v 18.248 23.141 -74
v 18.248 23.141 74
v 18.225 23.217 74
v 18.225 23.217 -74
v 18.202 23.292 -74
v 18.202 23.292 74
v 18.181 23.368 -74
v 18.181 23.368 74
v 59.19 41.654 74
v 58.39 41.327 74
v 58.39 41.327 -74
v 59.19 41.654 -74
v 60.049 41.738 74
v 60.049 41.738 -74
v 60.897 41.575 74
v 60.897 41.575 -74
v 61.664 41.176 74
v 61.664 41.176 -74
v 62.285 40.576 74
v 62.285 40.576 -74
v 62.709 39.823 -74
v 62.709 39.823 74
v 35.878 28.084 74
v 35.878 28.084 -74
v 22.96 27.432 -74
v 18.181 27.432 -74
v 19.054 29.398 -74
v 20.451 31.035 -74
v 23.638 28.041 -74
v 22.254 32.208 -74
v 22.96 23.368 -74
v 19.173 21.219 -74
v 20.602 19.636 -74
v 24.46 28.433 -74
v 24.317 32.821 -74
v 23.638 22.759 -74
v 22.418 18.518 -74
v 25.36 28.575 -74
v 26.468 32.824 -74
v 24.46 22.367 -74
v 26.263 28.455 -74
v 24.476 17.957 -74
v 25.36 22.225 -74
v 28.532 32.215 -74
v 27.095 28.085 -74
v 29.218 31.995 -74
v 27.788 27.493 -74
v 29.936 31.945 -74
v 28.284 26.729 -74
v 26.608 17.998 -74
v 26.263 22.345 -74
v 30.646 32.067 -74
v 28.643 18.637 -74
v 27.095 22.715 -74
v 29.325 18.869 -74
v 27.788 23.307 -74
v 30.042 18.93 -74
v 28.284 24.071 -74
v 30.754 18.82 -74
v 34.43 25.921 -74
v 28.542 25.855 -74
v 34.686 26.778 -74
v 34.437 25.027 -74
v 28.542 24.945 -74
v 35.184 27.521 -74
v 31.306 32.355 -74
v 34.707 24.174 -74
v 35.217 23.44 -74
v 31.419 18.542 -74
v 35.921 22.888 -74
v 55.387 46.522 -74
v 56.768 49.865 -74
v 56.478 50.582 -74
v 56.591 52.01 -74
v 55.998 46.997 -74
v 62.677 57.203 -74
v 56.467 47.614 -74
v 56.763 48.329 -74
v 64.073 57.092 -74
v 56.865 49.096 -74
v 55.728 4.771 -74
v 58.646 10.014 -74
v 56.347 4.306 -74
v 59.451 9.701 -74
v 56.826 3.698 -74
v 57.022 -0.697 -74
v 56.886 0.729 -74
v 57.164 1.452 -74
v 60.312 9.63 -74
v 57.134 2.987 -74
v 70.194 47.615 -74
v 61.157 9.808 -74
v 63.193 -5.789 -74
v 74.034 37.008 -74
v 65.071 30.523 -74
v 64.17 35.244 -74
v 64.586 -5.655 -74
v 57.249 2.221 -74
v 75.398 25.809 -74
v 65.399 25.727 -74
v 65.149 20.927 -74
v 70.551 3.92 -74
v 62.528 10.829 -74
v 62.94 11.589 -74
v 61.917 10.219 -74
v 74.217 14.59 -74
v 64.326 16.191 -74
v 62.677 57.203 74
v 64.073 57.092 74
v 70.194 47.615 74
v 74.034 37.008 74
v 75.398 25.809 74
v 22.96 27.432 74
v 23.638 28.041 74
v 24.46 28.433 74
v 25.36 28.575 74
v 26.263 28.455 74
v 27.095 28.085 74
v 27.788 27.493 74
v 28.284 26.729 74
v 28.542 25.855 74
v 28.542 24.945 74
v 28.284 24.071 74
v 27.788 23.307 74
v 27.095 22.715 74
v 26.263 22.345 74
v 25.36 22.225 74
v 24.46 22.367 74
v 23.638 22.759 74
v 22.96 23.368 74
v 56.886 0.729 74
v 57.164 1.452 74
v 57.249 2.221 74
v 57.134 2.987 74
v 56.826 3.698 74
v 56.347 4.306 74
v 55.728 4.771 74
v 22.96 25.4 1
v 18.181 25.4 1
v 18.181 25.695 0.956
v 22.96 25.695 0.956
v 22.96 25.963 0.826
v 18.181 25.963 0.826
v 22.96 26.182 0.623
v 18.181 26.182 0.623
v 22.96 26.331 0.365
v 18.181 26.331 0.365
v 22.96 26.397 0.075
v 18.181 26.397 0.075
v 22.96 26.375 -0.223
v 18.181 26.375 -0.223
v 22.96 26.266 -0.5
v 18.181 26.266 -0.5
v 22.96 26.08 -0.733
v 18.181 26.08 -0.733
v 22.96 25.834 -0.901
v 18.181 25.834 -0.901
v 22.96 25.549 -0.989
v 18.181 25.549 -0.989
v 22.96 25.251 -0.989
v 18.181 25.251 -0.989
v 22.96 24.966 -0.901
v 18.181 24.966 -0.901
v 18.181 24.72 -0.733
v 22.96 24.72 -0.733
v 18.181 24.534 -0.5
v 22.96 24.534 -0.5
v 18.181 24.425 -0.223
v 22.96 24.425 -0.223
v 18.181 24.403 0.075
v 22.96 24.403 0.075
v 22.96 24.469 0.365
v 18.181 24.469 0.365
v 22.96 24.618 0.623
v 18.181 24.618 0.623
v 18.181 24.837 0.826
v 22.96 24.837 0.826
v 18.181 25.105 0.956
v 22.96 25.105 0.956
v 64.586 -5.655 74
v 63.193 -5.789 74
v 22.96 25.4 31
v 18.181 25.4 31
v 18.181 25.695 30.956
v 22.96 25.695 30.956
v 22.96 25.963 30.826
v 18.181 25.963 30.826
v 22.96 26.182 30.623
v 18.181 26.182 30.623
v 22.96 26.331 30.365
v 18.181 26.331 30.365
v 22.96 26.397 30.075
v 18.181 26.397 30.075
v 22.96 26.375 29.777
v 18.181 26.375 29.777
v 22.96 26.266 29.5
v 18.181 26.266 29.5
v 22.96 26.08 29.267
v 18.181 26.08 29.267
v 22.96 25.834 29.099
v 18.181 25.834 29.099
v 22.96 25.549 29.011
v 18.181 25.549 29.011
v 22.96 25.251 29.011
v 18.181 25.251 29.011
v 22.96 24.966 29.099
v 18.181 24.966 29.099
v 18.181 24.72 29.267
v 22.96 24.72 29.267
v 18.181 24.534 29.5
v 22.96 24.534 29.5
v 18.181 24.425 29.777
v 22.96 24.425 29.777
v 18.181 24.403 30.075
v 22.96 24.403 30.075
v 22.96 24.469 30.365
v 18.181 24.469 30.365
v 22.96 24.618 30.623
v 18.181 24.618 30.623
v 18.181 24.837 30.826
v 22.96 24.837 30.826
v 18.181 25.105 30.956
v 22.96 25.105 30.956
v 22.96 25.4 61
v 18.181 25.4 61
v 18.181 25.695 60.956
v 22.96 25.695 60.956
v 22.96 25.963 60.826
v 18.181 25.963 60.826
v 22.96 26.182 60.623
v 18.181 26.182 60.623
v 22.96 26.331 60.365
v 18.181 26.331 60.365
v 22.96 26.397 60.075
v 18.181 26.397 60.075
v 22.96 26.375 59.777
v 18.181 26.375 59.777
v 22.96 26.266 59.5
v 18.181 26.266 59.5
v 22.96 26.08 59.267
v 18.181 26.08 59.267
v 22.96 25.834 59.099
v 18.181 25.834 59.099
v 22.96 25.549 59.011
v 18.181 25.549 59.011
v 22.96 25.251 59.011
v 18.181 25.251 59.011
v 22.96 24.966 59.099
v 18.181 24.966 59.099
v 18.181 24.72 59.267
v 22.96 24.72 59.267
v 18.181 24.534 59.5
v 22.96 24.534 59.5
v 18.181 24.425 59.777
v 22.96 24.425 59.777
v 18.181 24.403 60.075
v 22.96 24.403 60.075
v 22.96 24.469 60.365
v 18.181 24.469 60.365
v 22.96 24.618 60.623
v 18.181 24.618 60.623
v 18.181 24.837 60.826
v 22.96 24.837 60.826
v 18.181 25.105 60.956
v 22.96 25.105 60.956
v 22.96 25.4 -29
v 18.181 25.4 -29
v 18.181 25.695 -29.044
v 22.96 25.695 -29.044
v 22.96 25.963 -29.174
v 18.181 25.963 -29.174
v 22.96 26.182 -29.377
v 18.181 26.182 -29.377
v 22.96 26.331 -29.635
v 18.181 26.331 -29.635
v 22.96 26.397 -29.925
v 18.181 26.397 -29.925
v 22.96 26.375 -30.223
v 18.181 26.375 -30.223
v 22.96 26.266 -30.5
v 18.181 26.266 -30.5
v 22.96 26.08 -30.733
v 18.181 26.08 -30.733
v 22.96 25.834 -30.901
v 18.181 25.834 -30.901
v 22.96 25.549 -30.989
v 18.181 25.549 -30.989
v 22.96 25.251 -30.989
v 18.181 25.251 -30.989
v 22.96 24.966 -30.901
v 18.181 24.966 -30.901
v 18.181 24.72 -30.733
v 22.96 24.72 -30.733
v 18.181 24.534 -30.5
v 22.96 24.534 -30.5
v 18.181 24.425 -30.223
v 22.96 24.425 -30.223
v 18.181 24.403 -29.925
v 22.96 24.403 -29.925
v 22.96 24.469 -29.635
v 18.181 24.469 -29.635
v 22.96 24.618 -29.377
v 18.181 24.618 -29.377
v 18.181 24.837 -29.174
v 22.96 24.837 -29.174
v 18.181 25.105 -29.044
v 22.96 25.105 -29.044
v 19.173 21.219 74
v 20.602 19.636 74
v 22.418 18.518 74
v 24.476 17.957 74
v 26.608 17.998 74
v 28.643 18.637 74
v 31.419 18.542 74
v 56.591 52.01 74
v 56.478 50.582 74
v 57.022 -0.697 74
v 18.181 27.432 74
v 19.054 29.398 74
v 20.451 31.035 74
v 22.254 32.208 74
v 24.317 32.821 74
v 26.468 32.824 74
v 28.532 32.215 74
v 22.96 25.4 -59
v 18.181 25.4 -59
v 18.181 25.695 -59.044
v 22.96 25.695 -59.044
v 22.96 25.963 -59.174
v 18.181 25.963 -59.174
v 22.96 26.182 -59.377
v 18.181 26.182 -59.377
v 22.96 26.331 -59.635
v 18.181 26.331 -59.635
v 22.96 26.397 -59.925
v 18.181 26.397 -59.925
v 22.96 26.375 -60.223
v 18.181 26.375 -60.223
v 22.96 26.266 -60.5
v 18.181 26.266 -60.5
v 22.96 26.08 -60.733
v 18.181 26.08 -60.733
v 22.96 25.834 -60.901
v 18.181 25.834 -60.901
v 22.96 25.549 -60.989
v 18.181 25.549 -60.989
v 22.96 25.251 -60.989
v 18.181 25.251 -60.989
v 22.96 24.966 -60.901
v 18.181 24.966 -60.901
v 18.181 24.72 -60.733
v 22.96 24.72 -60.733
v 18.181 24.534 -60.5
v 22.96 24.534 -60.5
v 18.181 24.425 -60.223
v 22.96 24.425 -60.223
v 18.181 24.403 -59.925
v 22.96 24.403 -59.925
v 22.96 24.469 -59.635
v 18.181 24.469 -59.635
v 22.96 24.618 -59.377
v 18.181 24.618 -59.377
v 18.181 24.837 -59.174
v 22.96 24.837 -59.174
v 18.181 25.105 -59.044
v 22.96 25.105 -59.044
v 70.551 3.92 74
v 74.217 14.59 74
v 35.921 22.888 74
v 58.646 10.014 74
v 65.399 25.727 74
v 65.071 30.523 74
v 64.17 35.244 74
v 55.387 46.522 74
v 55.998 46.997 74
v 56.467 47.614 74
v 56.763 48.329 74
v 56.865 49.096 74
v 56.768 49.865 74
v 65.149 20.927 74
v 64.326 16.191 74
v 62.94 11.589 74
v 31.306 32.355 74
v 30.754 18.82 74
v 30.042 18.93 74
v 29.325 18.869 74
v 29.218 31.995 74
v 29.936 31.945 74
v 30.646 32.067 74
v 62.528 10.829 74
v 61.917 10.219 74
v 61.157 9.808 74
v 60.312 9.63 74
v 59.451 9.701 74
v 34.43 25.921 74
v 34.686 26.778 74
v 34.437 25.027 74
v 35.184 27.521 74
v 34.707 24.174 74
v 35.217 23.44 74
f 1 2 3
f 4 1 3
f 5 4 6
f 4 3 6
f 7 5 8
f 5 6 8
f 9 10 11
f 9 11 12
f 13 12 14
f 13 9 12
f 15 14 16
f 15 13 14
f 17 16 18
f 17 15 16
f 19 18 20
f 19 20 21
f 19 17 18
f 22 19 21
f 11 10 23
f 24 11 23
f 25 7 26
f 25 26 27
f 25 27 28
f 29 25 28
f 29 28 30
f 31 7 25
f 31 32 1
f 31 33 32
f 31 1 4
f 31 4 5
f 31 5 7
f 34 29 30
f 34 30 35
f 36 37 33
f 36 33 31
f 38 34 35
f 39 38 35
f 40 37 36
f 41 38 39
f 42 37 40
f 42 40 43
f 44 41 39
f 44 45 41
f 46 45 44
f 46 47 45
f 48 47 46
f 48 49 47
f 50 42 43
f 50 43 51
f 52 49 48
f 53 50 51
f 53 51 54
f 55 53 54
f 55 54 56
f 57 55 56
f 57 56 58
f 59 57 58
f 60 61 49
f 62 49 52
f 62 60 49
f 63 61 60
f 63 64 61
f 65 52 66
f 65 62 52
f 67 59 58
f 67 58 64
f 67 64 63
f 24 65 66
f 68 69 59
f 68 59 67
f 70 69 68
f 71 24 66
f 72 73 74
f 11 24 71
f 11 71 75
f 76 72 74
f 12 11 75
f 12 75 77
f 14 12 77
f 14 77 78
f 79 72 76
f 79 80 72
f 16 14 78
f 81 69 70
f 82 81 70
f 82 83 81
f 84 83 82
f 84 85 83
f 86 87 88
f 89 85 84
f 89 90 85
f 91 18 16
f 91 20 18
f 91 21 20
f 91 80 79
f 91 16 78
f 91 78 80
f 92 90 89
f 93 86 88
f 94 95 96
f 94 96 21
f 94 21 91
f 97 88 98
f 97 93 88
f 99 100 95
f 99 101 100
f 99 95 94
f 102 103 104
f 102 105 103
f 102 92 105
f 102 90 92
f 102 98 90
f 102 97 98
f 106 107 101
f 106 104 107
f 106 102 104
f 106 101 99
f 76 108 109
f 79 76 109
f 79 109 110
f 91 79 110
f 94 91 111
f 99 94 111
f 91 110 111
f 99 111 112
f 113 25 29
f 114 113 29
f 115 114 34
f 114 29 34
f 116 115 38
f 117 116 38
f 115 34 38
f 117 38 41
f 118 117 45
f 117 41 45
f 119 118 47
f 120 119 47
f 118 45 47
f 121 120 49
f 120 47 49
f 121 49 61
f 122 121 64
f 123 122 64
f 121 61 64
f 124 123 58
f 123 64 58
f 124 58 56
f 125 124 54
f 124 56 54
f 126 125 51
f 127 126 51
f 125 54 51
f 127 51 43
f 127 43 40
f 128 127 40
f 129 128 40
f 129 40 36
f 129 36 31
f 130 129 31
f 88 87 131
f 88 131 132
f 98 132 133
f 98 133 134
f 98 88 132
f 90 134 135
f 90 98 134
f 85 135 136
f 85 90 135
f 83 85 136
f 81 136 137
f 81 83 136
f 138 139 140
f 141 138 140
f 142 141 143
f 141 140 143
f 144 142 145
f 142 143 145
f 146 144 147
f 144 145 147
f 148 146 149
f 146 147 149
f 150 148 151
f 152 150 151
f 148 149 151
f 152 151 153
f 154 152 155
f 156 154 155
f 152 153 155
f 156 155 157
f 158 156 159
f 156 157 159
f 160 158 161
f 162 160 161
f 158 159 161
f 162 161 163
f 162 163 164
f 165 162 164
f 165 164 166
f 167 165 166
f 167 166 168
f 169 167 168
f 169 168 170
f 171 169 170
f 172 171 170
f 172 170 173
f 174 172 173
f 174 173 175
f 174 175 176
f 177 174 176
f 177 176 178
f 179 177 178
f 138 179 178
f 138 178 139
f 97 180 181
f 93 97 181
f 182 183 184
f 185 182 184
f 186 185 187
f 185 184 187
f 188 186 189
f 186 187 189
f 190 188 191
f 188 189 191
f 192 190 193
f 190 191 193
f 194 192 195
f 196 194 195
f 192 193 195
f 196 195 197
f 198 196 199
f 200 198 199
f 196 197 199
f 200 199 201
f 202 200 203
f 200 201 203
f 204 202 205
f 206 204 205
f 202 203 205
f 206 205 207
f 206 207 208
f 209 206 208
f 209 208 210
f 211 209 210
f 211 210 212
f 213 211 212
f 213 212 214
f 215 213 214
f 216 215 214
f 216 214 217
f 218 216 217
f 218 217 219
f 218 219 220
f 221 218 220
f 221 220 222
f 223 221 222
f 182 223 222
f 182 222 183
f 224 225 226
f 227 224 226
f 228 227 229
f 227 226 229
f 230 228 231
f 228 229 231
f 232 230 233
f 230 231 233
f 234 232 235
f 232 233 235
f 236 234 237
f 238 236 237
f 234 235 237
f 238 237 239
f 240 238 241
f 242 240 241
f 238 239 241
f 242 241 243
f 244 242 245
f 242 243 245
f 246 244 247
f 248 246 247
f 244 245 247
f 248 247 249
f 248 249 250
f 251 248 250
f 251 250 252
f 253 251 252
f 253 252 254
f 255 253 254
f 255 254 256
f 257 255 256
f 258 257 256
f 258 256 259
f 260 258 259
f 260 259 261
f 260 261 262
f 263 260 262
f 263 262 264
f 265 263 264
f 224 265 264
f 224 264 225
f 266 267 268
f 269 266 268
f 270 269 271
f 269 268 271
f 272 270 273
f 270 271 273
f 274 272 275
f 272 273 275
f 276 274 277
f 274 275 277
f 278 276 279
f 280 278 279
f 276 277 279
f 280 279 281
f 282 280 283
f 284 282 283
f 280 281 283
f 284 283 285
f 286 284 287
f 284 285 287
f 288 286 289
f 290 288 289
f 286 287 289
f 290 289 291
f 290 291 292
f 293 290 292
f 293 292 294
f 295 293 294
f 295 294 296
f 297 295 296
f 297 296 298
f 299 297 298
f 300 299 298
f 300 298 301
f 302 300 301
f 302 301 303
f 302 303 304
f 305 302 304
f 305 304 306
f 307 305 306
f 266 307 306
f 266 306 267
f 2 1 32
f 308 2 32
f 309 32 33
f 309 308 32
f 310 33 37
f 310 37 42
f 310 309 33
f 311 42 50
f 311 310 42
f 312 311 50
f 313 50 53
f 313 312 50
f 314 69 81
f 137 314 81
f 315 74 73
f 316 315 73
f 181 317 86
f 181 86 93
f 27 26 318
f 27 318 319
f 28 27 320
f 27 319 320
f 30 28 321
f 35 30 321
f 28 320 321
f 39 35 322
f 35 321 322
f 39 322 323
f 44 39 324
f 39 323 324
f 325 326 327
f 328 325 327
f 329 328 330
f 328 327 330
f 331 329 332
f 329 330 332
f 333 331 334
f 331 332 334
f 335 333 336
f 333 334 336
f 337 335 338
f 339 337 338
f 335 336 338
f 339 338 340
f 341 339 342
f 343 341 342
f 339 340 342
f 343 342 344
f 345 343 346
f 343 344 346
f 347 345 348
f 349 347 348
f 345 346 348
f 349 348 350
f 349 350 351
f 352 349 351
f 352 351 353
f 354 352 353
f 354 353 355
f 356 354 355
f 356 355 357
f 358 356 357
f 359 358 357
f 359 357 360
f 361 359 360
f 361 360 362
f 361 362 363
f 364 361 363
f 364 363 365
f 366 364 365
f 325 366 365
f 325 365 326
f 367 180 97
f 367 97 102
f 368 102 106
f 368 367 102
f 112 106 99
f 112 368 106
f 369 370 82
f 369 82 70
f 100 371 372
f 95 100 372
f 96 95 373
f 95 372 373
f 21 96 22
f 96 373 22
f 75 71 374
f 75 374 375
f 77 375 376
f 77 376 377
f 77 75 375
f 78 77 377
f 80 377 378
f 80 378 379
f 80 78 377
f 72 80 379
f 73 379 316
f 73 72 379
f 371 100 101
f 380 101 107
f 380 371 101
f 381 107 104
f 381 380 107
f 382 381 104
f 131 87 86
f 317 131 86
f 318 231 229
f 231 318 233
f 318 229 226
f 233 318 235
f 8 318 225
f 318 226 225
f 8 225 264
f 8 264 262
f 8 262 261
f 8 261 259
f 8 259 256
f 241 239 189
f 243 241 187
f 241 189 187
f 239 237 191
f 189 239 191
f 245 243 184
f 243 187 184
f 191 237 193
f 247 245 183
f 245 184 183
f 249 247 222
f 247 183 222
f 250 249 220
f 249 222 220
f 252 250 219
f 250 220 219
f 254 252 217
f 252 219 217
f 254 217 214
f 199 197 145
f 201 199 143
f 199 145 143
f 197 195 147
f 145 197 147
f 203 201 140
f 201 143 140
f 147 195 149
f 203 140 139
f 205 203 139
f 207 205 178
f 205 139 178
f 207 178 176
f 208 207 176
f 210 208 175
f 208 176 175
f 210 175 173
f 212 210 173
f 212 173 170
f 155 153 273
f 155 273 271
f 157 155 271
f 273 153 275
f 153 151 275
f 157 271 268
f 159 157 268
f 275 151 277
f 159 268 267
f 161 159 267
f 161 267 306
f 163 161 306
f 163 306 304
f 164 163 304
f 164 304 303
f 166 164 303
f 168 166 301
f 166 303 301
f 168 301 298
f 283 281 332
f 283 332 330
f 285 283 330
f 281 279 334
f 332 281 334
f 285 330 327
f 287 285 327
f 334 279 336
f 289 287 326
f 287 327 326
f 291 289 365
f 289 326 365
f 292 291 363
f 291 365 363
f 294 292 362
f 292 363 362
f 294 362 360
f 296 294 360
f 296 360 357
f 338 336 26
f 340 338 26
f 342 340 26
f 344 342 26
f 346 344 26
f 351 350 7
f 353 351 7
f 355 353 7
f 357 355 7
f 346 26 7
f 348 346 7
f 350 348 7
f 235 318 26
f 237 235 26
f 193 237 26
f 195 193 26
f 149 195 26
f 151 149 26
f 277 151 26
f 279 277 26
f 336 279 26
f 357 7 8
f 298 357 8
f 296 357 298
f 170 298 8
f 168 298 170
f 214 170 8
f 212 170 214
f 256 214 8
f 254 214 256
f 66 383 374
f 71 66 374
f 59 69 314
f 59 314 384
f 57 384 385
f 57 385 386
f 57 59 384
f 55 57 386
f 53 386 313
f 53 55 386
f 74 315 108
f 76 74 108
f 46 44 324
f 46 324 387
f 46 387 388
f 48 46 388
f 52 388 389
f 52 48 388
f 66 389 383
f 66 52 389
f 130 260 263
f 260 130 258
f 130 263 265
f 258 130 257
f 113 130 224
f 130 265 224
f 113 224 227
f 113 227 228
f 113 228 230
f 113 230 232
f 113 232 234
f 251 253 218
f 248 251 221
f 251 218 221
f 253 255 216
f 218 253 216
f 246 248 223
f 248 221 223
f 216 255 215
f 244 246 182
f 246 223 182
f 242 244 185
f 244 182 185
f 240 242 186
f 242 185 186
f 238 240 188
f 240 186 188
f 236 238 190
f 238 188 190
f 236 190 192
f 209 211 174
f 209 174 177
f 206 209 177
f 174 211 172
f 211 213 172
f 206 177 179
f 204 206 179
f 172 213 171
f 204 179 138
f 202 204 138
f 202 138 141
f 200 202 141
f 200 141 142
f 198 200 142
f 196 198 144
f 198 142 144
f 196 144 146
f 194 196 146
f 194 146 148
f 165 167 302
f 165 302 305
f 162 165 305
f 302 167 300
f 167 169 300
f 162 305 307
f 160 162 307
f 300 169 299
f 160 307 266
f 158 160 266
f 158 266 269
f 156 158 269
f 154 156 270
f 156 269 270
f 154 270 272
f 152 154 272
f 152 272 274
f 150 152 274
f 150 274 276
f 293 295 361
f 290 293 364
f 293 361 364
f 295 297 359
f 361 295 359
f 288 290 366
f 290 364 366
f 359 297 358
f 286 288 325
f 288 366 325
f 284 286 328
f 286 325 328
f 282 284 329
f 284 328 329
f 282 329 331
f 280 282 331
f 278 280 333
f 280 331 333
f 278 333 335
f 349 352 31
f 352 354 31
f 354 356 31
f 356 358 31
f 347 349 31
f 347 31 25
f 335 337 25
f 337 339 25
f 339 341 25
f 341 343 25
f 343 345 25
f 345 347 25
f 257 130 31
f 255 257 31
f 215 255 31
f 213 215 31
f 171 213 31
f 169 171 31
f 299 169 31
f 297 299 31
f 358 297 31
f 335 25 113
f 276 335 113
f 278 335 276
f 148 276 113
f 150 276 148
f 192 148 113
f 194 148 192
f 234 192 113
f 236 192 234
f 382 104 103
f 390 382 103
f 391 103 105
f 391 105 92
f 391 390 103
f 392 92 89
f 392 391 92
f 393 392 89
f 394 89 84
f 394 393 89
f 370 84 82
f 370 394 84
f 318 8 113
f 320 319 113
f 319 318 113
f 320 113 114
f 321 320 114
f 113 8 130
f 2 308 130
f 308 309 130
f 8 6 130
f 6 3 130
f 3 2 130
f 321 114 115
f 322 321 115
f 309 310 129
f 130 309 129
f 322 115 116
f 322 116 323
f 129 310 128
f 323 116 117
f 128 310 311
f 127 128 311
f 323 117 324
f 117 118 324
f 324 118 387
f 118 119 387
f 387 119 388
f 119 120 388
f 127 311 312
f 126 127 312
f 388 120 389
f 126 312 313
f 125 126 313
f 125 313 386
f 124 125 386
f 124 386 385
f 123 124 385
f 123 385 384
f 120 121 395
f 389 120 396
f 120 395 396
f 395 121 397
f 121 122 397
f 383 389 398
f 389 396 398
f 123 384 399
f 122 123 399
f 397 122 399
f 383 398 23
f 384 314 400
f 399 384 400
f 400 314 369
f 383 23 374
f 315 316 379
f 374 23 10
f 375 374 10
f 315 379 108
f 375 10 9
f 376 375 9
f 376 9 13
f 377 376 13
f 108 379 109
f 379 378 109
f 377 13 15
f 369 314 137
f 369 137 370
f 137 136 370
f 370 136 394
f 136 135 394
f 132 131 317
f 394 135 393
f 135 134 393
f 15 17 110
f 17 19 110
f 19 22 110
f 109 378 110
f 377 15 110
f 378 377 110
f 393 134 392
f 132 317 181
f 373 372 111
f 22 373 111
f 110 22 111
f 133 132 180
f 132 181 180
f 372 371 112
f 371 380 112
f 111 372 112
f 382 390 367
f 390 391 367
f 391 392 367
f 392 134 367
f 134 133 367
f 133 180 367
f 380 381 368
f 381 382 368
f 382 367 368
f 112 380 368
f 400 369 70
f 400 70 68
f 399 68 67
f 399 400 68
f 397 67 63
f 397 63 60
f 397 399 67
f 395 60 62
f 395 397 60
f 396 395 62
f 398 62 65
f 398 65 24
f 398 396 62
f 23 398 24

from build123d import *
from build123d.topology import SkipClean

# Parameters (mm, degrees)
BOSS_EXTRUDE1_DEPTH     = 74
CHAMFER1_SIZE           = 1
FILLET1_R               = 3
CUT_EXTRUDE1_DEPTH      = 121.138628729
CUT_EXTRUDE1_DEPTH_BACK = 121.138628729
CUT_EXTRUDE2_REACH      = 111.646
SKETCH4_R               = 1


with BuildPart() as part:
    # Sketch1 → Boss-Extrude1 (new, symmetric)
    with BuildSketch(Plane.XY):
        with BuildLine():
            Line((55.830466766, 51.361253738), (63.438083445, 57.851567172))
            ThreePointArc((63.438083445, 57.851567172), (72.243195979, 42.88470747), (75.398327752, 25.808934001))
            Line((75.398327752, 25.808934001), (65.398662212, 25.727147202))
            ThreePointArc((65.398662212, 25.727147202), (64.324262485, 34.614216947), (61.300381376, 43.039802177))
            Line((61.300381376, 43.039802177), (31.399799374, 25.449072083))
            Line((31.399799374, 25.449072083), (26.399966604, 25.408178684))
            ThreePointArc((26.399966604, 25.408178684), (25.395910676, 26.399991642), (24.40000005, 25.400000004))
            ThreePointArc((24.40000005, 25.400000004), (24.411675325, 25.24763781), (24.446428526, 25.098833357))
            Line((24.446428526, 25.098833357), (18.248213622, 23.141250154))
            ThreePointArc((18.248213622, 23.141250154), (17.987564613, 24.25728355), (17.90000005, 25.400000004))
            ThreePointArc((17.90000005, 25.400000004), (21.992343112, 32.081158151), (29.803433168, 31.471225314))
            Line((29.803433168, 31.471225314), (58.257984046, 48.211244769))
            ThreePointArc((58.257984046, 48.211244769), (57.083396924, 49.816436323), (55.830466766, 51.361253738))
        make_face()
    boss_extrude1 = extrude(amount=BOSS_EXTRUDE1_DEPTH, both=True)

    # Mirror1: Boss-Extrude1 across plane
    with SkipClean():  # the faces are left unmerged after this step: merging them gives an invalid solid
        add(boss_extrude1.mirror(Plane(origin=(-0.206032496, 25.190569454, 0), x_dir=(0, 0, 1), z_dir=(0.008178679945042752, -0.9999665540378622, 0))))

    # Chamfer1
    # the kernel refuses this chamfer: 1 mm, written as the material it takes off along each edge
    with BuildSketch(Plane(origin=(55.830466766, 51.361253738, -76.604800739), x_dir=(0.7607616678932755, 0.6490313433604278, 0), z_dir=(0, 0, 1))) as chamfer1_piece_1:
        with BuildLine():
            Line((CHAMFER1_SIZE, 0), (-0.01282473, -1.01282473))
            ThreePointArc((-0.01282473, -1.01282473), (-0.003390265, -0.520777989), (0, 0))
            Line((0, 0), (CHAMFER1_SIZE, 0))
        make_face()
    extrude(amount=153.209601479, mode=Mode.SUBTRACT)
    with BuildSketch(Plane(origin=(63.438083445, 57.851567172, 76.571682988), x_dir=(-0.7607616678932776, -0.6490313433604255, 0), z_dir=(0, 0, -1))) as chamfer1_piece_2:
        with BuildLine():
            Line((CHAMFER1_SIZE, 0), (0.009805807, -0.990194193))
            ThreePointArc((0.009805807, -0.990194193), (0.002592086, -0.509118755), (0, 0))
            Line((0, 0), (CHAMFER1_SIZE, 0))
        make_face()
    extrude(amount=153.143365976, mode=Mode.SUBTRACT)
    with BuildSketch(Plane(origin=(63.963798858, -6.425043932, 76.571682988), x_dir=(0.6288321665267481, 0.7775410640868277, 0), z_dir=(0, 0, -1))) as chamfer1_piece_3:
        with BuildLine():
            Line((0.990242745, 0), (CHAMFER1_SIZE * 0.00990242744899, -CHAMFER1_SIZE * 0.999950969763))
            Line((CHAMFER1_SIZE * 0.00990242744899, -CHAMFER1_SIZE * 0.999950969763), (0, 0))
            ThreePointArc((0, 0), (0.509119461, 0.002449552), (0.990242745, 0))
        make_face()
    extrude(amount=153.143365976, mode=Mode.SUBTRACT)
    with BuildSketch(Plane(origin=(56.251039097, -0.060035145, -76.604800739), x_dir=(0.6266844831673307, 0.7792730962616993, 0), z_dir=(0, 0, 1))) as chamfer1_piece_4:
        with BuildLine():
            Line((1.012905922, 0), (-CHAMFER1_SIZE * 0.0126613240298, -CHAMFER1_SIZE * 0.999919842224))
            Line((-CHAMFER1_SIZE * 0.0126613240298, -CHAMFER1_SIZE * 0.999919842224), (0, 0))
            ThreePointArc((0, 0), (0.520779169, -0.003203746), (1.012905922, 0))
        make_face()
    extrude(amount=153.209601479, mode=Mode.SUBTRACT)

    # Fillet1
    # the kernel refuses this fillet: 3 mm, written as the material it adds along each edge
    with BuildSketch(Plane(origin=(61.300381376, 43.039802177, 74), x_dir=(-0.8619070987590498, -0.5070662216207636, 0), z_dir=(0, 0, -1))) as fillet1_piece_1:
        with BuildLine():
            CenterArc((3.377068823, -3), FILLET1_R, 90, 99.332418184)
            Line((0.416776456, -3.486486486), (0.357570609, -3.496216216))
            ThreePointArc((0.357570609, -3.496216216), (0.110537283, -1.754940397), (-0.059831012, -0.0045))
            Line((-0.059831012, -0.0045), (0, 0.06))
            Line((0, 0.06), (3.377068823, 0.06))
            Line((3.377068823, 0.06), (3.377068823, 0))
        make_face()
    extrude(amount=148)
    with BuildSketch(Plane(origin=(31.399799374, 25.449072083, 74), x_dir=(0.861907098759051, 0.5070662216207618, 0), z_dir=(0, 0, -1))) as fillet1_piece_2:
        with BuildLine():
            CenterArc((FILLET1_R * 1.73205080757, FILLET1_R), FILLET1_R, 150, 120)
            Line((FILLET1_R * 0.866025403784, FILLET1_R * 1.5), (FILLET1_R * 0.848704895709, FILLET1_R * 1.51))
            Line((FILLET1_R * 0.848704895709, FILLET1_R * 1.51), (-FILLET1_R * 0.0346410161514, -FILLET1_R * 0.02))
            Line((-FILLET1_R * 0.0346410161514, -FILLET1_R * 0.02), (FILLET1_R * 1.73205080757, -FILLET1_R * 0.02))
            Line((FILLET1_R * 1.73205080757, -FILLET1_R * 0.02), (FILLET1_R * 1.73205080757, 0))
        make_face()
    extrude(amount=148)
    with BuildSketch(Plane(origin=(29.803433168, 31.471225314, -74), x_dir=(-0.8632427379298097, 0.5047890405025113, 0), z_dir=(0, 0, 1))) as fillet1_piece_3:
        with BuildLine():
            CenterArc((1.767704789, -2.985498375), FILLET1_R, 95.63586305, 55.150095421)
            Line((-0.850702684, -1.521277659), (-0.903070833, -1.491993244))
            Line((-0.903070833, -1.491993244), (-0.052368149, 0.029284414))
            Line((-0.052368149, 0.029284414), (0.005892349, 0.059709968))
            ThreePointArc((0.005892349, 0.059709968), (0.736543662, 0.023745938), (1.467194975, 0.059709968))
            Line((1.467194975, 0.059709968), (1.473087324, 0))
        make_face()
    extrude(amount=148)
    with BuildSketch(Plane(origin=(58.257984046, 48.211244769, -74), x_dir=(-0.6003331349359272, 0.7997500403863709, 0), z_dir=(0, 0, 1))) as fillet1_piece_4:
        with BuildLine():
            CenterArc((3.35394685, 2.974664865), FILLET1_R, 173.574848661, 88.973633867)
            Line((0.372790176, 3.310380343), (0.313167042, 3.317094653))
            Line((0.313167042, 3.317094653), (-0.059623133, 0.00671431))
            Line((-0.059623133, 0.00671431), (-0.002223664, -0.05995878))
            ThreePointArc((-0.002223664, -0.05995878), (1.482442617, -0.087479891), (2.957104003, -0.059493297))
            Line((2.957104003, -0.059493297), (2.964885235, 0))
        make_face()
    extrude(amount=148)
    with BuildSketch(Plane(origin=(61.584109507, 8.349773529, 74), x_dir=(-0.8700857787040926, 0.49290033241710485, 0), z_dir=(0, 0, -1))) as fillet1_piece_5:
        with BuildLine():
            CenterArc((3.377068823, 3), FILLET1_R, 170.667581816, 99.332418184)
            Line((0.416776456, 3.486486486), (0.357570609, 3.496216216))
            ThreePointArc((0.357570609, 3.496216216), (0.110537283, 1.754940397), (-0.059831012, 0.0045))
            Line((-0.059831012, 0.0045), (0, -0.06))
            Line((0, -0.06), (3.377068823, -0.06))
            Line((3.377068823, -0.06), (3.377068823, 0))
        make_face()
    extrude(amount=148)
    with BuildSketch(Plane(origin=(58.626707512, 3.129258857, -74), x_dir=(-0.870085778704093, 0.49290033241710457, 0), z_dir=(0, 0, 1))) as fillet1_piece_6:
        with BuildLine():
            CenterArc((3.331304629, 3), FILLET1_R, 181.026366133, 88.973633867)
            Line((0.331785955, 2.946262469), (0.271795581, 2.945187718))
            ThreePointArc((0.271795581, 2.945187718), (0.078962557, 1.482920686), (-0.059831012, 0.0045))
            Line((-0.059831012, 0.0045), (0, -0.06))
            Line((0, -0.06), (3.331304629, -0.06))
            Line((3.331304629, -0.06), (3.331304629, 0))
        make_face()
    extrude(amount=148)
    with BuildSketch(Plane(origin=(29.902149966, 19.401613043, -74), x_dir=(-0.8548705120852164, -0.5188414088786282, 0), z_dir=(0, 0, 1))) as fillet1_piece_7:
        with BuildLine():
            CenterArc((1.767704789, 2.985498375), FILLET1_R, 209.214041529, 55.150095421)
            Line((-0.850702684, 1.521277659), (-0.903070833, 1.491993244))
            Line((-0.903070833, 1.491993244), (-0.052368149, -0.029284414))
            Line((-0.052368149, -0.029284414), (0.005892349, -0.059709968))
            ThreePointArc((0.005892349, -0.059709968), (0.736543662, -0.023745938), (1.467194975, -0.059709968))
            Line((1.467194975, -0.059709968), (1.473087324, 0))
        make_face()
    extrude(amount=148)

    # Sketch3 → Cut-Extrude1 (cut, two sides: drawn at the far end of the back side and taken through both)
    with BuildSketch(Plane.XY.offset(-CUT_EXTRUDE1_DEPTH_BACK)):
        with BuildLine():
            Line((22.960409716, 23.368000004), (22.960409716, 27.432000004))
            ThreePointArc((22.960409716, 27.432000004), (28.57500005, 25.400000004), (22.960409716, 23.368000004))
        make_face()
        with BuildLine():
            Line((18.180514196, 27.432000004), (18.180514196, 23.368000004))
            ThreePointArc((18.180514196, 23.368000004), (17.90000005, 25.400000004), (18.180514196, 27.432000004))
        make_face()
    extrude(amount=CUT_EXTRUDE1_DEPTH + CUT_EXTRUDE1_DEPTH_BACK, mode=Mode.SUBTRACT)

    # Sketch4 → Cut-Extrude2 (cut, up to next)
    with BuildSketch(Plane.ZY.offset(-18.180514196), mode=Mode.PRIVATE) as cut_extrude2_sk1:
        with Locations((0, 25.400000004)):
            Circle(SKETCH4_R)
    cut_extrude2_tool1 = extrude(cut_extrude2_sk1.sketch, amount=-CUT_EXTRUDE2_REACH, mode=Mode.PRIVATE) & part.part
    # Sketch4 → Cut-Extrude2 (cut, up to next)
    with BuildSketch(Plane.ZY.offset(-18.180514196), mode=Mode.PRIVATE) as cut_extrude2_sk2:
        with Locations((30, 25.400000004)):
            Circle(SKETCH4_R)
    cut_extrude2_tool2 = extrude(cut_extrude2_sk2.sketch, amount=-CUT_EXTRUDE2_REACH, mode=Mode.PRIVATE) & part.part
    # Sketch4 → Cut-Extrude2 (cut, up to next)
    with BuildSketch(Plane.ZY.offset(-18.180514196), mode=Mode.PRIVATE) as cut_extrude2_sk3:
        with Locations((60, 25.400000004)):
            Circle(SKETCH4_R)
    cut_extrude2_tool3 = extrude(cut_extrude2_sk3.sketch, amount=-CUT_EXTRUDE2_REACH, mode=Mode.PRIVATE) & part.part
    # Sketch4 → Cut-Extrude2 (cut, up to next)
    with BuildSketch(Plane.ZY.offset(-18.180514196), mode=Mode.PRIVATE) as cut_extrude2_sk4:
        with Locations((-30, 25.400000004)):
            Circle(SKETCH4_R)
    cut_extrude2_tool4 = extrude(cut_extrude2_sk4.sketch, amount=-CUT_EXTRUDE2_REACH, mode=Mode.PRIVATE) & part.part
    # Sketch4 → Cut-Extrude2 (cut, up to next)
    with BuildSketch(Plane.ZY.offset(-18.180514196), mode=Mode.PRIVATE) as cut_extrude2_sk5:
        with Locations((-60, 25.400000004)):
            Circle(SKETCH4_R)
    cut_extrude2_tool5 = extrude(cut_extrude2_sk5.sketch, amount=-CUT_EXTRUDE2_REACH, mode=Mode.PRIVATE) & part.part
    add(cut_extrude2_tool1.solids().sort_by_distance((18.180514, 25.4, 0))[0], mode=Mode.SUBTRACT)
    add(cut_extrude2_tool2.solids().sort_by_distance((18.180514, 25.4, 30))[0], mode=Mode.SUBTRACT)
    add(cut_extrude2_tool3.solids().sort_by_distance((18.180514, 25.4, 60))[0], mode=Mode.SUBTRACT)
    add(cut_extrude2_tool4.solids().sort_by_distance((18.180514, 25.4, -30))[0], mode=Mode.SUBTRACT)
    add(cut_extrude2_tool5.solids().sort_by_distance((18.180514, 25.4, -60))[0], mode=Mode.SUBTRACT)


solid = part.part
